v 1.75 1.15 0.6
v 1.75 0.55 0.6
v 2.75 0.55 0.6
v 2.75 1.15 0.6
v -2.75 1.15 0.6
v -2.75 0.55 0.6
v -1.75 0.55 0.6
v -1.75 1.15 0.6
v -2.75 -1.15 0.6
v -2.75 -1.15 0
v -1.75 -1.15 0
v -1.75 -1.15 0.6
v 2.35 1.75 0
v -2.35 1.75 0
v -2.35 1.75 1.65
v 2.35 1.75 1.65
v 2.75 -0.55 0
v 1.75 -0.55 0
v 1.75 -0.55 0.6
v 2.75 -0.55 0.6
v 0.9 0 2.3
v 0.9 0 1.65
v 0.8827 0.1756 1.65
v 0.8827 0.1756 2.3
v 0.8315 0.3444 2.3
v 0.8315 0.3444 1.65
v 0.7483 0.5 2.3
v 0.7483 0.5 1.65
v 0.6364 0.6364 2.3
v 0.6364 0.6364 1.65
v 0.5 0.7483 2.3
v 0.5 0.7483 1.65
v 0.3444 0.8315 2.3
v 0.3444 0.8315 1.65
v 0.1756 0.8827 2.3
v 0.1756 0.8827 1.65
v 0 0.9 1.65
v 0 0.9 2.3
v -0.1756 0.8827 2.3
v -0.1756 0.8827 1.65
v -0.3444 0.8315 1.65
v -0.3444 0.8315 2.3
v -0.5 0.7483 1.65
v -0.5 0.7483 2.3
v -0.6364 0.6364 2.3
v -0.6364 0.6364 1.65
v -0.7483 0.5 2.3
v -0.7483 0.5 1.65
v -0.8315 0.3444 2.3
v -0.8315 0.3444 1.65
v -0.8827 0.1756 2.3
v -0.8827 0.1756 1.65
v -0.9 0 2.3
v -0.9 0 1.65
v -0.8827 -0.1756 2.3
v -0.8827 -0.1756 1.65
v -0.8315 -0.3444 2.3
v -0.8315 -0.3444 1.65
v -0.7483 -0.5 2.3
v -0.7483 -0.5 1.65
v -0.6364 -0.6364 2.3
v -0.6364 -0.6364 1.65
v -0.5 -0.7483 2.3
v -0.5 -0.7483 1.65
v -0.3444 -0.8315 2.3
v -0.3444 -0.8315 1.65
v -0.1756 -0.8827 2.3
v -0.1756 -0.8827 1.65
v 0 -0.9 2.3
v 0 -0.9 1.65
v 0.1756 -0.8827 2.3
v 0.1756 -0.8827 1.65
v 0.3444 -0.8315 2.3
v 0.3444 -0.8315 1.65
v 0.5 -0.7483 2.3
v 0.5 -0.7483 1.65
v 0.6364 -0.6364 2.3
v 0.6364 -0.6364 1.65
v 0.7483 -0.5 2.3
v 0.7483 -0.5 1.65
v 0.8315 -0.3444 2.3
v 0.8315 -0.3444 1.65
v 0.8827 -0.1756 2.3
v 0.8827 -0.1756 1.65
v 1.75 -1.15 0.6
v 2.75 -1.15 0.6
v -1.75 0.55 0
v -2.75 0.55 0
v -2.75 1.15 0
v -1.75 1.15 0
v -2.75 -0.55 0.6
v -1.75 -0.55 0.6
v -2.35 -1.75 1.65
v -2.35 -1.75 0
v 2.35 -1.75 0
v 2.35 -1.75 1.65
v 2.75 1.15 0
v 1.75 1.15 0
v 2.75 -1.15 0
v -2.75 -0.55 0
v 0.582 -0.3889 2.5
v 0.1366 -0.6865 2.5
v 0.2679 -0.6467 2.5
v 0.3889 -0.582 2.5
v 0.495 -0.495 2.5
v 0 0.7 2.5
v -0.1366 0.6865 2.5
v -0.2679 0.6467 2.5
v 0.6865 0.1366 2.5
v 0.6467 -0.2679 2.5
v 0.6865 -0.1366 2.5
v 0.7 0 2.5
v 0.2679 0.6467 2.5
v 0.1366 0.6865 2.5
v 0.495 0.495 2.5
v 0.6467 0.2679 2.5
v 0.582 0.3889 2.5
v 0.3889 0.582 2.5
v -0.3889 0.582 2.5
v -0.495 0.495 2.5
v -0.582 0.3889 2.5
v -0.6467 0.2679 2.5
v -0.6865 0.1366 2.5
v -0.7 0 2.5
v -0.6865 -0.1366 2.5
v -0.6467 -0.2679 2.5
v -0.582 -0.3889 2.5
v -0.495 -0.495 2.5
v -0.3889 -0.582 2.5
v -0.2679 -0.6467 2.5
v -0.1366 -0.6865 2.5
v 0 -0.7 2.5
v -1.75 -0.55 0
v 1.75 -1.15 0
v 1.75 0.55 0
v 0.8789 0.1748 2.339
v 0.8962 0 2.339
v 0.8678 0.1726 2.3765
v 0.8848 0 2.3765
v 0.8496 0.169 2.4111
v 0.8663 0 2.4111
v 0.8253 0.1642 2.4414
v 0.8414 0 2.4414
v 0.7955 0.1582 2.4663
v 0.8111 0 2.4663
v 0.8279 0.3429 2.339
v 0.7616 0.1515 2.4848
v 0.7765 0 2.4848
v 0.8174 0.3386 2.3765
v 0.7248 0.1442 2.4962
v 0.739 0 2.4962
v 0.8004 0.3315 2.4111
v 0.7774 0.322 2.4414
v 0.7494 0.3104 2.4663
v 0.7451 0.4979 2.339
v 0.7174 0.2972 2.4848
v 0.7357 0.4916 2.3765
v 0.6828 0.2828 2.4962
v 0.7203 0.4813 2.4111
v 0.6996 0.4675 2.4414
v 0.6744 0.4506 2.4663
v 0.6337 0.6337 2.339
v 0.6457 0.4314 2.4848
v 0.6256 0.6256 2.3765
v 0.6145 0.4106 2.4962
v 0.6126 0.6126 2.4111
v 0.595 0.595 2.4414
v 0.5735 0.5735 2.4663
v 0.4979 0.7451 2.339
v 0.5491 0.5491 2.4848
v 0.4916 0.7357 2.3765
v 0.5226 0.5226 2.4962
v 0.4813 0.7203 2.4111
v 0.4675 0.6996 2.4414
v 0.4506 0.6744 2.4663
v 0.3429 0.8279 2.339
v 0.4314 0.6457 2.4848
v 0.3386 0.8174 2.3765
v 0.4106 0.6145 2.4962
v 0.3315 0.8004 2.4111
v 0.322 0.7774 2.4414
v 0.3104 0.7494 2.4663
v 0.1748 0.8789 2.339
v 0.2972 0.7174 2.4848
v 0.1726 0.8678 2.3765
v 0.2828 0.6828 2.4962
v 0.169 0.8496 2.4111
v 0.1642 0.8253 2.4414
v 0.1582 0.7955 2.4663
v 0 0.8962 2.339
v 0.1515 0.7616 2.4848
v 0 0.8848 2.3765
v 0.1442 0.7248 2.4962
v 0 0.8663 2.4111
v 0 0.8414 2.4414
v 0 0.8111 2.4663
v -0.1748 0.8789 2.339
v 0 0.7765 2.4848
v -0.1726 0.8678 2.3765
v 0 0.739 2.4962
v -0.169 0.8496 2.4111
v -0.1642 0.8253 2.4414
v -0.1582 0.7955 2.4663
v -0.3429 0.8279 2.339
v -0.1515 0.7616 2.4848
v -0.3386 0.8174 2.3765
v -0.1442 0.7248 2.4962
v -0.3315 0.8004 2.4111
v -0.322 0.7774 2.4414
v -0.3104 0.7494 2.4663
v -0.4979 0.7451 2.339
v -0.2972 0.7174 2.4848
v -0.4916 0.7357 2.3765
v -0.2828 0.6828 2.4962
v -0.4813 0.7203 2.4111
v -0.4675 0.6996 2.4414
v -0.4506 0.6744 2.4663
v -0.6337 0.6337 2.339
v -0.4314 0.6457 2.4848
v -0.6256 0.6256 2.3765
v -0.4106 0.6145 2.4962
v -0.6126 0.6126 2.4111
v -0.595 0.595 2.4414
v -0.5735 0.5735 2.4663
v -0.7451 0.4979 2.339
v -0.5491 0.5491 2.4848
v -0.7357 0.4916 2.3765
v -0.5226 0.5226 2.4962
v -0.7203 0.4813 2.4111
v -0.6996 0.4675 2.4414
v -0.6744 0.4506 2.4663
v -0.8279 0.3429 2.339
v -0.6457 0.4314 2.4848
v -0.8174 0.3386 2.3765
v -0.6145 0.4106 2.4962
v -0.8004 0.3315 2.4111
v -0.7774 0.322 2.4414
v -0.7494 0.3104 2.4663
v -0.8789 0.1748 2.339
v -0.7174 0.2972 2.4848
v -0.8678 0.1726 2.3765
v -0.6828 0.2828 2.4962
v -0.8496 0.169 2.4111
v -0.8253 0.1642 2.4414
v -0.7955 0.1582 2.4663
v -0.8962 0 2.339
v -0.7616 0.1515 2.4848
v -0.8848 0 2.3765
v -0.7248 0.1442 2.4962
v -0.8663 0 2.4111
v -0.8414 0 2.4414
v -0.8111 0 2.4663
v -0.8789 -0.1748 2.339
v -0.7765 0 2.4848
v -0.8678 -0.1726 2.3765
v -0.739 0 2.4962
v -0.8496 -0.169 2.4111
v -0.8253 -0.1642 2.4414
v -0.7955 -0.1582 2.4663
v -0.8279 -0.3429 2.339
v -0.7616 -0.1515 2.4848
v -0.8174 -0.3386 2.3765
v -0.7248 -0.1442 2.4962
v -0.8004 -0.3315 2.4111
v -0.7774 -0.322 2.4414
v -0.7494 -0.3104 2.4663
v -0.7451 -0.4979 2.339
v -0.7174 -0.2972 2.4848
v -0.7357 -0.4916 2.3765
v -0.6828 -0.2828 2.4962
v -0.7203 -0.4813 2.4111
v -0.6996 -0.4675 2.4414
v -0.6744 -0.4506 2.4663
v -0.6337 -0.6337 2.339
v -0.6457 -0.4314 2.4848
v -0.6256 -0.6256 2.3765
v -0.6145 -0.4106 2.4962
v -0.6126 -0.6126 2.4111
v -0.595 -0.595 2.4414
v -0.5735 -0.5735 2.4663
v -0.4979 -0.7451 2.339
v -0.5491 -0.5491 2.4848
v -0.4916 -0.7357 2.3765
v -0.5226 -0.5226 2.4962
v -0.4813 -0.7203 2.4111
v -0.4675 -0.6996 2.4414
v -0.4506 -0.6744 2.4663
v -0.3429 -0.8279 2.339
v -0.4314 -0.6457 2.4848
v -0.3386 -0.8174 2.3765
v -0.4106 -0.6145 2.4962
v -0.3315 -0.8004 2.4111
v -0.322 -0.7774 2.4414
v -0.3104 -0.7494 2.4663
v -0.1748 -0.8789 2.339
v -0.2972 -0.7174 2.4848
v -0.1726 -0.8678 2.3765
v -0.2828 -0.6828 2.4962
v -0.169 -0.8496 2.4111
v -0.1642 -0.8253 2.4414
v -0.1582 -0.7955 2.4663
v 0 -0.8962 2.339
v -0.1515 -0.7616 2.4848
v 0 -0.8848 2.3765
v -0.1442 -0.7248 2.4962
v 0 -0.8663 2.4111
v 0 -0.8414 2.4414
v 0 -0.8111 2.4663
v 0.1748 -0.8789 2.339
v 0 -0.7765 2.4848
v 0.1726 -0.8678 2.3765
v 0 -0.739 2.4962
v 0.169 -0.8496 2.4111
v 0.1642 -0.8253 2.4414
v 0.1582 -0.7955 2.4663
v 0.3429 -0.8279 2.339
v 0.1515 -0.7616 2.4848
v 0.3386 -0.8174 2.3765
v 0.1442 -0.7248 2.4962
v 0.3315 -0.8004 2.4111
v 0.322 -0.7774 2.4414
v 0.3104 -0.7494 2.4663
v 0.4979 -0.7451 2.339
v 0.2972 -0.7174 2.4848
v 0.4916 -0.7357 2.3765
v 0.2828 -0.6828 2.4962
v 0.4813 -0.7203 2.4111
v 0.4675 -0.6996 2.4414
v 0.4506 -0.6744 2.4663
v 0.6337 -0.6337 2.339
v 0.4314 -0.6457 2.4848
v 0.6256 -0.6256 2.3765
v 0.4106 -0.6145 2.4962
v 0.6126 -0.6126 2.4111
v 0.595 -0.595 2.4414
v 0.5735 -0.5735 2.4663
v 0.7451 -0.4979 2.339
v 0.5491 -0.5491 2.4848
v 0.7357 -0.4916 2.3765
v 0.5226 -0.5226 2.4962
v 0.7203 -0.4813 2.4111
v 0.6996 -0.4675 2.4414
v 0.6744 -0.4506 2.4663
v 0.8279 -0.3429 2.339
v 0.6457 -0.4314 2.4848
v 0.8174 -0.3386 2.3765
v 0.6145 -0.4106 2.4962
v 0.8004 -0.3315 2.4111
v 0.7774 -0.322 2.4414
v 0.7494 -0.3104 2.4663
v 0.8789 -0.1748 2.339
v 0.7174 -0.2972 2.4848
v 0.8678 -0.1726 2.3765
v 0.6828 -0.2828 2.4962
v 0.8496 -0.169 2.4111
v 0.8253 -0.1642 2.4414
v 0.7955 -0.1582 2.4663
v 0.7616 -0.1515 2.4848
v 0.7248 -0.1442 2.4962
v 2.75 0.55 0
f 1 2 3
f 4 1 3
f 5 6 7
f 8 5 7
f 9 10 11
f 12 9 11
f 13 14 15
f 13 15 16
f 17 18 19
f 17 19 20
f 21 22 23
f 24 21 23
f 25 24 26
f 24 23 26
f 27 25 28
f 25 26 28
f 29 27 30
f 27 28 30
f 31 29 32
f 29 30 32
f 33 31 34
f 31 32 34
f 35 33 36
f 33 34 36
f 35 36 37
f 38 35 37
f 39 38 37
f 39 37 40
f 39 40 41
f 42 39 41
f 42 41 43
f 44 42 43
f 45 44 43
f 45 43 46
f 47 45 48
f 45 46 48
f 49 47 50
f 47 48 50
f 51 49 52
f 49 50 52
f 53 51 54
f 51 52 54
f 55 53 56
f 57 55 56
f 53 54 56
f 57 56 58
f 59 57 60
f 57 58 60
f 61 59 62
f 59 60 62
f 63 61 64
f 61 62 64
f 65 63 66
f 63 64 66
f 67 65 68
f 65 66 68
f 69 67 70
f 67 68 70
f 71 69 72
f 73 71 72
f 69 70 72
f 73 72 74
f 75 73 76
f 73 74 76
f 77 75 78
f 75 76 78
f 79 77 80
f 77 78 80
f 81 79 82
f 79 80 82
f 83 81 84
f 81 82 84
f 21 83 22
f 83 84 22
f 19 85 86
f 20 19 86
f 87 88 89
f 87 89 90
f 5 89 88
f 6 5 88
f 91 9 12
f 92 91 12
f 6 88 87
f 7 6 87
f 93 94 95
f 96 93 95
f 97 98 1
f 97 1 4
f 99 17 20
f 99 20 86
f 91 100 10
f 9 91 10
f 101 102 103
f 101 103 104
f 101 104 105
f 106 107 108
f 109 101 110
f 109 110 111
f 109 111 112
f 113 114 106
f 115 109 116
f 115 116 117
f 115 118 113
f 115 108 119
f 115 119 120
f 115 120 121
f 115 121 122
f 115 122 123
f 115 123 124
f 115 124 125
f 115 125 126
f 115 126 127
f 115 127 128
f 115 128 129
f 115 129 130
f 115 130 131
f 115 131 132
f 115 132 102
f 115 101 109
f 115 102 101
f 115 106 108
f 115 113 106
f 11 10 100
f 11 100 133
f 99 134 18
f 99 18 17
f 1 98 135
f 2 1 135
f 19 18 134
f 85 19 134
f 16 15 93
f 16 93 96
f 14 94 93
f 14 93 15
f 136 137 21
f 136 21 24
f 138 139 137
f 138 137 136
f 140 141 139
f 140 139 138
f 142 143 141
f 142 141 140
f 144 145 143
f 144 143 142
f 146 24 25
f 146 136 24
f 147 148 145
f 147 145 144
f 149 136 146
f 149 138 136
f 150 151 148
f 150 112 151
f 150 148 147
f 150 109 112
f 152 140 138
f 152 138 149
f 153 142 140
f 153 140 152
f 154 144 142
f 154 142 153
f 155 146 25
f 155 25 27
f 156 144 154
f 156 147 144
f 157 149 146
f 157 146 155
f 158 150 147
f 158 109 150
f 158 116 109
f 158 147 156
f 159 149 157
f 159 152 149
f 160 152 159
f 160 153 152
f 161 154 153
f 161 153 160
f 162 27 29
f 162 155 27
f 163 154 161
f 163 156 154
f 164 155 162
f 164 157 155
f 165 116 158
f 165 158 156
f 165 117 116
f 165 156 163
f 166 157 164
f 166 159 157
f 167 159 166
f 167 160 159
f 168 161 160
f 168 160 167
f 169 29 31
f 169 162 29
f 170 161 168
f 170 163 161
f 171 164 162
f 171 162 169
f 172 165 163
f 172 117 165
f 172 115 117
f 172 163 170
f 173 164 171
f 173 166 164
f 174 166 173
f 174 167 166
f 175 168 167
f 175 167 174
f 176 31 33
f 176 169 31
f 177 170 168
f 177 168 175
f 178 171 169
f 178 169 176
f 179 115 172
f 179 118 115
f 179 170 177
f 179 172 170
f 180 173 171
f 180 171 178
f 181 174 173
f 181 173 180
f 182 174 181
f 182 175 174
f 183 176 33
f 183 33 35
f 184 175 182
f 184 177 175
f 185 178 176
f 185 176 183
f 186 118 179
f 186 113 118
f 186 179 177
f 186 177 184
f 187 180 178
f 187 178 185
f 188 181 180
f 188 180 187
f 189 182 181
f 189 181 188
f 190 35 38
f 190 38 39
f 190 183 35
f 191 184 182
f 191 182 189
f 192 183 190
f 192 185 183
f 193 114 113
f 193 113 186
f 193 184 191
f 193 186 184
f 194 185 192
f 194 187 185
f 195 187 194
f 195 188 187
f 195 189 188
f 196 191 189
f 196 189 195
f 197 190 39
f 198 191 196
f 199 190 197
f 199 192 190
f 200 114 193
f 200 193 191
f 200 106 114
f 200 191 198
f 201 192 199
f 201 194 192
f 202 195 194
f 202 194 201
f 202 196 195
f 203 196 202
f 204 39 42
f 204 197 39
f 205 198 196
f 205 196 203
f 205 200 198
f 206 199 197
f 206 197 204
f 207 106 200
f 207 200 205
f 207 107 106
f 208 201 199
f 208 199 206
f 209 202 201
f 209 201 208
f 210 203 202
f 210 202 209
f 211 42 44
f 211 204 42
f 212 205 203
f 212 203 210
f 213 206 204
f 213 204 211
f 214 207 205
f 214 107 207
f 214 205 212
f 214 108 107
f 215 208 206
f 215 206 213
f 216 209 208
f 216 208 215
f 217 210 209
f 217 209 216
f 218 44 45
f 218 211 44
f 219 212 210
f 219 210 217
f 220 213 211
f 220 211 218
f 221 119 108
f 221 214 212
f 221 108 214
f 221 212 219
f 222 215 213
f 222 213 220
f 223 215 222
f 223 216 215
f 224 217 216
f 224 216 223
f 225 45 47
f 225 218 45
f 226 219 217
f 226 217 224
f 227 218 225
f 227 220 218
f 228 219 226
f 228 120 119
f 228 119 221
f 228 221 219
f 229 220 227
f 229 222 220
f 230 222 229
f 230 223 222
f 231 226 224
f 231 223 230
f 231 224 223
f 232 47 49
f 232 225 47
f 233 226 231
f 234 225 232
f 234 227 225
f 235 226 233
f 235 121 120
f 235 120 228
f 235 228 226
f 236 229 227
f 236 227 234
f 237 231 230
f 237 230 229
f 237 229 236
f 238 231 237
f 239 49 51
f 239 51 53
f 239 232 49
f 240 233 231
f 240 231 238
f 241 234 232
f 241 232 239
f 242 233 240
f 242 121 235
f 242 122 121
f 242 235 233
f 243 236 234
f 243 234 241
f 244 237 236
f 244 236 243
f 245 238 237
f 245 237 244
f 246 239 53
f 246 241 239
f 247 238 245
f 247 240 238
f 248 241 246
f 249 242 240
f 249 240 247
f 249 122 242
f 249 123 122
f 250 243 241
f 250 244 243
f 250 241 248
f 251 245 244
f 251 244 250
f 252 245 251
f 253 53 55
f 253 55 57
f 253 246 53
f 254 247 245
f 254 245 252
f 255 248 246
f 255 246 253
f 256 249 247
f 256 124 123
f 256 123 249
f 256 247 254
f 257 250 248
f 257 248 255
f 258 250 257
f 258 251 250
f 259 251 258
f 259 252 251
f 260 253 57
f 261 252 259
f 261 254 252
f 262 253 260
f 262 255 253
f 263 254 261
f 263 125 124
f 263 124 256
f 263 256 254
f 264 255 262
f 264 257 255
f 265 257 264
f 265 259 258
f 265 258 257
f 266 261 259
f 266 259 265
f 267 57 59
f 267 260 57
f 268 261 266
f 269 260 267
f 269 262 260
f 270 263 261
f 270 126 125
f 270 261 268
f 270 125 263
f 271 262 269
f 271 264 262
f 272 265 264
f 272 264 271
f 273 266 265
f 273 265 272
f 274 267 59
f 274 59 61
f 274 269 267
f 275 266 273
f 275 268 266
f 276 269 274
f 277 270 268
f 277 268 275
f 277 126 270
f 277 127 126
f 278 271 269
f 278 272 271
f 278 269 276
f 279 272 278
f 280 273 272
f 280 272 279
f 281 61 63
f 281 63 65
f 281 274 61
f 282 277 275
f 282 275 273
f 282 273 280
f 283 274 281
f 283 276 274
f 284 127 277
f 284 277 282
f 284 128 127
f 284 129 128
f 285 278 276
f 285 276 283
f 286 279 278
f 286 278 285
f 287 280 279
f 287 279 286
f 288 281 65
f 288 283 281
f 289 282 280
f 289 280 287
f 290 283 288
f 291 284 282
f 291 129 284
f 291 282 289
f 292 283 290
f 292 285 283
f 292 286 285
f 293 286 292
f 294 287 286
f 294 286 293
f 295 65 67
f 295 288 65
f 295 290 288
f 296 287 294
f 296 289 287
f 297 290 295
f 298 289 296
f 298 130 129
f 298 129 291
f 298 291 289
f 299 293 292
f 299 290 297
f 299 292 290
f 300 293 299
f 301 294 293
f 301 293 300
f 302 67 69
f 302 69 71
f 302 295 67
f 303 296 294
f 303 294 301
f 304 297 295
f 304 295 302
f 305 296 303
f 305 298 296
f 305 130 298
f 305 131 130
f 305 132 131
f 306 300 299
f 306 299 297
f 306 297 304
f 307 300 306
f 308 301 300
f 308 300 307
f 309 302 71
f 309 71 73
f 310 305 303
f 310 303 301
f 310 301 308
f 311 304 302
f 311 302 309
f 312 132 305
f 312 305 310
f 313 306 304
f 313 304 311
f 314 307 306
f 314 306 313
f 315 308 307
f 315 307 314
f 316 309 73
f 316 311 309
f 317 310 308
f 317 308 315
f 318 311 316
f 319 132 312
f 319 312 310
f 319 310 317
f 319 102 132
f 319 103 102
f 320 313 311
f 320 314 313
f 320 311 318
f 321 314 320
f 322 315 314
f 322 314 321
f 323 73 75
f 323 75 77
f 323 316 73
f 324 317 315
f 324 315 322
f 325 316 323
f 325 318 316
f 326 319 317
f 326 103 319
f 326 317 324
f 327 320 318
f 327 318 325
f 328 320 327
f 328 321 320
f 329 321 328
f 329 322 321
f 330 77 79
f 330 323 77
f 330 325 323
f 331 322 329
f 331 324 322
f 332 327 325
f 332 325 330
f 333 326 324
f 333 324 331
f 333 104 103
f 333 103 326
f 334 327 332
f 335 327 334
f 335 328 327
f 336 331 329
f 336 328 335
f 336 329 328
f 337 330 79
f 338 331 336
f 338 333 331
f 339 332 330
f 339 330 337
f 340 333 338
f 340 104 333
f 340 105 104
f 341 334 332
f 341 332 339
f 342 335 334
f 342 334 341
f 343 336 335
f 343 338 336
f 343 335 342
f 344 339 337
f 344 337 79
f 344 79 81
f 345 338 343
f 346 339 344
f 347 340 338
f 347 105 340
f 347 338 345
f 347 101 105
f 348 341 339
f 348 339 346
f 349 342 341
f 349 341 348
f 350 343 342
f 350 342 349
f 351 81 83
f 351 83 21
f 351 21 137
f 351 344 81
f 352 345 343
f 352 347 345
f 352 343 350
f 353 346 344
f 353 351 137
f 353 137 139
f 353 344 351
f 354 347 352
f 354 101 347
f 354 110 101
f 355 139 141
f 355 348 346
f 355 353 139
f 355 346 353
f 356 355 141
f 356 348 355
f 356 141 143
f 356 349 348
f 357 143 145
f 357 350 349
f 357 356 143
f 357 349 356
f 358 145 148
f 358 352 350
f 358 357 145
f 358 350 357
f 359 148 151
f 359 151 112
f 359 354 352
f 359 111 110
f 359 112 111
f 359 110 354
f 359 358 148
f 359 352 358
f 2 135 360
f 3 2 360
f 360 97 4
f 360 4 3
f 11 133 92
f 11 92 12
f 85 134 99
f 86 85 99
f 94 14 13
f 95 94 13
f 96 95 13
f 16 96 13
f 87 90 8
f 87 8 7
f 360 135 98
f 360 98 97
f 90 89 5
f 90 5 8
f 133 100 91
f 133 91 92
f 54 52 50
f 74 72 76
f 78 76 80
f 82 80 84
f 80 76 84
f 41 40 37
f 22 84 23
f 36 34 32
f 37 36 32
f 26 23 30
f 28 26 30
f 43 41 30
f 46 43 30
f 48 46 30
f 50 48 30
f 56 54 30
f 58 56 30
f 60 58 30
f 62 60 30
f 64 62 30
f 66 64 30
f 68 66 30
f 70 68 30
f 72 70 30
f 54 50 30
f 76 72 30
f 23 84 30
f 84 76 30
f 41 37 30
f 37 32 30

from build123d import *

# Parameters (mm, degrees)
F0_W     = 4.7
F0_H     = 3.5
F1_DEPTH = 1.65
F2_W     = 1
F2_H     = 0.6
F3_DEPTH = 0.6
F4_R     = 0.9
F5_DEPTH = 0.85
F6_R     = 0.2


with BuildPart() as f1:
    # F0 (on Top) → F1 (new body)
    with BuildSketch(Plane.XY):
        Rectangle(F0_W, F0_H)
    extrude(amount=F1_DEPTH)


with BuildPart() as f3:
    # F2 (on face) → F3 (new body)
    with BuildSketch(Plane(origin=(0, 0, 0), x_dir=(1, 0, 0), z_dir=(0, 0, -1))):
        with Locations((-2.25, 0.85)):
            Rectangle(F2_W, F2_H)
        with Locations((2.25, 0.85)):
            Rectangle(F2_W, F2_H)
        with Locations((2.25, -0.85)):
            Rectangle(F2_W, F2_H)
        with Locations((-2.25, -0.85)):
            Rectangle(F2_W, F2_H)
    extrude(amount=-F3_DEPTH)


with BuildPart() as f5:
    # F4 (on face) → F5 (new body)
    with BuildSketch(Plane.XY.offset(1.65)):
        Circle(F4_R)
    extrude(amount=F5_DEPTH)

    # F6
    f6_edges = [f5.edges().sort_by_distance(p)[0] for p in [
        (-0.9, 0, 2.5),
    ]]
    fillet(f6_edges, radius=F6_R)


solid = Compound([f1.part, f3.part, f5.part])
